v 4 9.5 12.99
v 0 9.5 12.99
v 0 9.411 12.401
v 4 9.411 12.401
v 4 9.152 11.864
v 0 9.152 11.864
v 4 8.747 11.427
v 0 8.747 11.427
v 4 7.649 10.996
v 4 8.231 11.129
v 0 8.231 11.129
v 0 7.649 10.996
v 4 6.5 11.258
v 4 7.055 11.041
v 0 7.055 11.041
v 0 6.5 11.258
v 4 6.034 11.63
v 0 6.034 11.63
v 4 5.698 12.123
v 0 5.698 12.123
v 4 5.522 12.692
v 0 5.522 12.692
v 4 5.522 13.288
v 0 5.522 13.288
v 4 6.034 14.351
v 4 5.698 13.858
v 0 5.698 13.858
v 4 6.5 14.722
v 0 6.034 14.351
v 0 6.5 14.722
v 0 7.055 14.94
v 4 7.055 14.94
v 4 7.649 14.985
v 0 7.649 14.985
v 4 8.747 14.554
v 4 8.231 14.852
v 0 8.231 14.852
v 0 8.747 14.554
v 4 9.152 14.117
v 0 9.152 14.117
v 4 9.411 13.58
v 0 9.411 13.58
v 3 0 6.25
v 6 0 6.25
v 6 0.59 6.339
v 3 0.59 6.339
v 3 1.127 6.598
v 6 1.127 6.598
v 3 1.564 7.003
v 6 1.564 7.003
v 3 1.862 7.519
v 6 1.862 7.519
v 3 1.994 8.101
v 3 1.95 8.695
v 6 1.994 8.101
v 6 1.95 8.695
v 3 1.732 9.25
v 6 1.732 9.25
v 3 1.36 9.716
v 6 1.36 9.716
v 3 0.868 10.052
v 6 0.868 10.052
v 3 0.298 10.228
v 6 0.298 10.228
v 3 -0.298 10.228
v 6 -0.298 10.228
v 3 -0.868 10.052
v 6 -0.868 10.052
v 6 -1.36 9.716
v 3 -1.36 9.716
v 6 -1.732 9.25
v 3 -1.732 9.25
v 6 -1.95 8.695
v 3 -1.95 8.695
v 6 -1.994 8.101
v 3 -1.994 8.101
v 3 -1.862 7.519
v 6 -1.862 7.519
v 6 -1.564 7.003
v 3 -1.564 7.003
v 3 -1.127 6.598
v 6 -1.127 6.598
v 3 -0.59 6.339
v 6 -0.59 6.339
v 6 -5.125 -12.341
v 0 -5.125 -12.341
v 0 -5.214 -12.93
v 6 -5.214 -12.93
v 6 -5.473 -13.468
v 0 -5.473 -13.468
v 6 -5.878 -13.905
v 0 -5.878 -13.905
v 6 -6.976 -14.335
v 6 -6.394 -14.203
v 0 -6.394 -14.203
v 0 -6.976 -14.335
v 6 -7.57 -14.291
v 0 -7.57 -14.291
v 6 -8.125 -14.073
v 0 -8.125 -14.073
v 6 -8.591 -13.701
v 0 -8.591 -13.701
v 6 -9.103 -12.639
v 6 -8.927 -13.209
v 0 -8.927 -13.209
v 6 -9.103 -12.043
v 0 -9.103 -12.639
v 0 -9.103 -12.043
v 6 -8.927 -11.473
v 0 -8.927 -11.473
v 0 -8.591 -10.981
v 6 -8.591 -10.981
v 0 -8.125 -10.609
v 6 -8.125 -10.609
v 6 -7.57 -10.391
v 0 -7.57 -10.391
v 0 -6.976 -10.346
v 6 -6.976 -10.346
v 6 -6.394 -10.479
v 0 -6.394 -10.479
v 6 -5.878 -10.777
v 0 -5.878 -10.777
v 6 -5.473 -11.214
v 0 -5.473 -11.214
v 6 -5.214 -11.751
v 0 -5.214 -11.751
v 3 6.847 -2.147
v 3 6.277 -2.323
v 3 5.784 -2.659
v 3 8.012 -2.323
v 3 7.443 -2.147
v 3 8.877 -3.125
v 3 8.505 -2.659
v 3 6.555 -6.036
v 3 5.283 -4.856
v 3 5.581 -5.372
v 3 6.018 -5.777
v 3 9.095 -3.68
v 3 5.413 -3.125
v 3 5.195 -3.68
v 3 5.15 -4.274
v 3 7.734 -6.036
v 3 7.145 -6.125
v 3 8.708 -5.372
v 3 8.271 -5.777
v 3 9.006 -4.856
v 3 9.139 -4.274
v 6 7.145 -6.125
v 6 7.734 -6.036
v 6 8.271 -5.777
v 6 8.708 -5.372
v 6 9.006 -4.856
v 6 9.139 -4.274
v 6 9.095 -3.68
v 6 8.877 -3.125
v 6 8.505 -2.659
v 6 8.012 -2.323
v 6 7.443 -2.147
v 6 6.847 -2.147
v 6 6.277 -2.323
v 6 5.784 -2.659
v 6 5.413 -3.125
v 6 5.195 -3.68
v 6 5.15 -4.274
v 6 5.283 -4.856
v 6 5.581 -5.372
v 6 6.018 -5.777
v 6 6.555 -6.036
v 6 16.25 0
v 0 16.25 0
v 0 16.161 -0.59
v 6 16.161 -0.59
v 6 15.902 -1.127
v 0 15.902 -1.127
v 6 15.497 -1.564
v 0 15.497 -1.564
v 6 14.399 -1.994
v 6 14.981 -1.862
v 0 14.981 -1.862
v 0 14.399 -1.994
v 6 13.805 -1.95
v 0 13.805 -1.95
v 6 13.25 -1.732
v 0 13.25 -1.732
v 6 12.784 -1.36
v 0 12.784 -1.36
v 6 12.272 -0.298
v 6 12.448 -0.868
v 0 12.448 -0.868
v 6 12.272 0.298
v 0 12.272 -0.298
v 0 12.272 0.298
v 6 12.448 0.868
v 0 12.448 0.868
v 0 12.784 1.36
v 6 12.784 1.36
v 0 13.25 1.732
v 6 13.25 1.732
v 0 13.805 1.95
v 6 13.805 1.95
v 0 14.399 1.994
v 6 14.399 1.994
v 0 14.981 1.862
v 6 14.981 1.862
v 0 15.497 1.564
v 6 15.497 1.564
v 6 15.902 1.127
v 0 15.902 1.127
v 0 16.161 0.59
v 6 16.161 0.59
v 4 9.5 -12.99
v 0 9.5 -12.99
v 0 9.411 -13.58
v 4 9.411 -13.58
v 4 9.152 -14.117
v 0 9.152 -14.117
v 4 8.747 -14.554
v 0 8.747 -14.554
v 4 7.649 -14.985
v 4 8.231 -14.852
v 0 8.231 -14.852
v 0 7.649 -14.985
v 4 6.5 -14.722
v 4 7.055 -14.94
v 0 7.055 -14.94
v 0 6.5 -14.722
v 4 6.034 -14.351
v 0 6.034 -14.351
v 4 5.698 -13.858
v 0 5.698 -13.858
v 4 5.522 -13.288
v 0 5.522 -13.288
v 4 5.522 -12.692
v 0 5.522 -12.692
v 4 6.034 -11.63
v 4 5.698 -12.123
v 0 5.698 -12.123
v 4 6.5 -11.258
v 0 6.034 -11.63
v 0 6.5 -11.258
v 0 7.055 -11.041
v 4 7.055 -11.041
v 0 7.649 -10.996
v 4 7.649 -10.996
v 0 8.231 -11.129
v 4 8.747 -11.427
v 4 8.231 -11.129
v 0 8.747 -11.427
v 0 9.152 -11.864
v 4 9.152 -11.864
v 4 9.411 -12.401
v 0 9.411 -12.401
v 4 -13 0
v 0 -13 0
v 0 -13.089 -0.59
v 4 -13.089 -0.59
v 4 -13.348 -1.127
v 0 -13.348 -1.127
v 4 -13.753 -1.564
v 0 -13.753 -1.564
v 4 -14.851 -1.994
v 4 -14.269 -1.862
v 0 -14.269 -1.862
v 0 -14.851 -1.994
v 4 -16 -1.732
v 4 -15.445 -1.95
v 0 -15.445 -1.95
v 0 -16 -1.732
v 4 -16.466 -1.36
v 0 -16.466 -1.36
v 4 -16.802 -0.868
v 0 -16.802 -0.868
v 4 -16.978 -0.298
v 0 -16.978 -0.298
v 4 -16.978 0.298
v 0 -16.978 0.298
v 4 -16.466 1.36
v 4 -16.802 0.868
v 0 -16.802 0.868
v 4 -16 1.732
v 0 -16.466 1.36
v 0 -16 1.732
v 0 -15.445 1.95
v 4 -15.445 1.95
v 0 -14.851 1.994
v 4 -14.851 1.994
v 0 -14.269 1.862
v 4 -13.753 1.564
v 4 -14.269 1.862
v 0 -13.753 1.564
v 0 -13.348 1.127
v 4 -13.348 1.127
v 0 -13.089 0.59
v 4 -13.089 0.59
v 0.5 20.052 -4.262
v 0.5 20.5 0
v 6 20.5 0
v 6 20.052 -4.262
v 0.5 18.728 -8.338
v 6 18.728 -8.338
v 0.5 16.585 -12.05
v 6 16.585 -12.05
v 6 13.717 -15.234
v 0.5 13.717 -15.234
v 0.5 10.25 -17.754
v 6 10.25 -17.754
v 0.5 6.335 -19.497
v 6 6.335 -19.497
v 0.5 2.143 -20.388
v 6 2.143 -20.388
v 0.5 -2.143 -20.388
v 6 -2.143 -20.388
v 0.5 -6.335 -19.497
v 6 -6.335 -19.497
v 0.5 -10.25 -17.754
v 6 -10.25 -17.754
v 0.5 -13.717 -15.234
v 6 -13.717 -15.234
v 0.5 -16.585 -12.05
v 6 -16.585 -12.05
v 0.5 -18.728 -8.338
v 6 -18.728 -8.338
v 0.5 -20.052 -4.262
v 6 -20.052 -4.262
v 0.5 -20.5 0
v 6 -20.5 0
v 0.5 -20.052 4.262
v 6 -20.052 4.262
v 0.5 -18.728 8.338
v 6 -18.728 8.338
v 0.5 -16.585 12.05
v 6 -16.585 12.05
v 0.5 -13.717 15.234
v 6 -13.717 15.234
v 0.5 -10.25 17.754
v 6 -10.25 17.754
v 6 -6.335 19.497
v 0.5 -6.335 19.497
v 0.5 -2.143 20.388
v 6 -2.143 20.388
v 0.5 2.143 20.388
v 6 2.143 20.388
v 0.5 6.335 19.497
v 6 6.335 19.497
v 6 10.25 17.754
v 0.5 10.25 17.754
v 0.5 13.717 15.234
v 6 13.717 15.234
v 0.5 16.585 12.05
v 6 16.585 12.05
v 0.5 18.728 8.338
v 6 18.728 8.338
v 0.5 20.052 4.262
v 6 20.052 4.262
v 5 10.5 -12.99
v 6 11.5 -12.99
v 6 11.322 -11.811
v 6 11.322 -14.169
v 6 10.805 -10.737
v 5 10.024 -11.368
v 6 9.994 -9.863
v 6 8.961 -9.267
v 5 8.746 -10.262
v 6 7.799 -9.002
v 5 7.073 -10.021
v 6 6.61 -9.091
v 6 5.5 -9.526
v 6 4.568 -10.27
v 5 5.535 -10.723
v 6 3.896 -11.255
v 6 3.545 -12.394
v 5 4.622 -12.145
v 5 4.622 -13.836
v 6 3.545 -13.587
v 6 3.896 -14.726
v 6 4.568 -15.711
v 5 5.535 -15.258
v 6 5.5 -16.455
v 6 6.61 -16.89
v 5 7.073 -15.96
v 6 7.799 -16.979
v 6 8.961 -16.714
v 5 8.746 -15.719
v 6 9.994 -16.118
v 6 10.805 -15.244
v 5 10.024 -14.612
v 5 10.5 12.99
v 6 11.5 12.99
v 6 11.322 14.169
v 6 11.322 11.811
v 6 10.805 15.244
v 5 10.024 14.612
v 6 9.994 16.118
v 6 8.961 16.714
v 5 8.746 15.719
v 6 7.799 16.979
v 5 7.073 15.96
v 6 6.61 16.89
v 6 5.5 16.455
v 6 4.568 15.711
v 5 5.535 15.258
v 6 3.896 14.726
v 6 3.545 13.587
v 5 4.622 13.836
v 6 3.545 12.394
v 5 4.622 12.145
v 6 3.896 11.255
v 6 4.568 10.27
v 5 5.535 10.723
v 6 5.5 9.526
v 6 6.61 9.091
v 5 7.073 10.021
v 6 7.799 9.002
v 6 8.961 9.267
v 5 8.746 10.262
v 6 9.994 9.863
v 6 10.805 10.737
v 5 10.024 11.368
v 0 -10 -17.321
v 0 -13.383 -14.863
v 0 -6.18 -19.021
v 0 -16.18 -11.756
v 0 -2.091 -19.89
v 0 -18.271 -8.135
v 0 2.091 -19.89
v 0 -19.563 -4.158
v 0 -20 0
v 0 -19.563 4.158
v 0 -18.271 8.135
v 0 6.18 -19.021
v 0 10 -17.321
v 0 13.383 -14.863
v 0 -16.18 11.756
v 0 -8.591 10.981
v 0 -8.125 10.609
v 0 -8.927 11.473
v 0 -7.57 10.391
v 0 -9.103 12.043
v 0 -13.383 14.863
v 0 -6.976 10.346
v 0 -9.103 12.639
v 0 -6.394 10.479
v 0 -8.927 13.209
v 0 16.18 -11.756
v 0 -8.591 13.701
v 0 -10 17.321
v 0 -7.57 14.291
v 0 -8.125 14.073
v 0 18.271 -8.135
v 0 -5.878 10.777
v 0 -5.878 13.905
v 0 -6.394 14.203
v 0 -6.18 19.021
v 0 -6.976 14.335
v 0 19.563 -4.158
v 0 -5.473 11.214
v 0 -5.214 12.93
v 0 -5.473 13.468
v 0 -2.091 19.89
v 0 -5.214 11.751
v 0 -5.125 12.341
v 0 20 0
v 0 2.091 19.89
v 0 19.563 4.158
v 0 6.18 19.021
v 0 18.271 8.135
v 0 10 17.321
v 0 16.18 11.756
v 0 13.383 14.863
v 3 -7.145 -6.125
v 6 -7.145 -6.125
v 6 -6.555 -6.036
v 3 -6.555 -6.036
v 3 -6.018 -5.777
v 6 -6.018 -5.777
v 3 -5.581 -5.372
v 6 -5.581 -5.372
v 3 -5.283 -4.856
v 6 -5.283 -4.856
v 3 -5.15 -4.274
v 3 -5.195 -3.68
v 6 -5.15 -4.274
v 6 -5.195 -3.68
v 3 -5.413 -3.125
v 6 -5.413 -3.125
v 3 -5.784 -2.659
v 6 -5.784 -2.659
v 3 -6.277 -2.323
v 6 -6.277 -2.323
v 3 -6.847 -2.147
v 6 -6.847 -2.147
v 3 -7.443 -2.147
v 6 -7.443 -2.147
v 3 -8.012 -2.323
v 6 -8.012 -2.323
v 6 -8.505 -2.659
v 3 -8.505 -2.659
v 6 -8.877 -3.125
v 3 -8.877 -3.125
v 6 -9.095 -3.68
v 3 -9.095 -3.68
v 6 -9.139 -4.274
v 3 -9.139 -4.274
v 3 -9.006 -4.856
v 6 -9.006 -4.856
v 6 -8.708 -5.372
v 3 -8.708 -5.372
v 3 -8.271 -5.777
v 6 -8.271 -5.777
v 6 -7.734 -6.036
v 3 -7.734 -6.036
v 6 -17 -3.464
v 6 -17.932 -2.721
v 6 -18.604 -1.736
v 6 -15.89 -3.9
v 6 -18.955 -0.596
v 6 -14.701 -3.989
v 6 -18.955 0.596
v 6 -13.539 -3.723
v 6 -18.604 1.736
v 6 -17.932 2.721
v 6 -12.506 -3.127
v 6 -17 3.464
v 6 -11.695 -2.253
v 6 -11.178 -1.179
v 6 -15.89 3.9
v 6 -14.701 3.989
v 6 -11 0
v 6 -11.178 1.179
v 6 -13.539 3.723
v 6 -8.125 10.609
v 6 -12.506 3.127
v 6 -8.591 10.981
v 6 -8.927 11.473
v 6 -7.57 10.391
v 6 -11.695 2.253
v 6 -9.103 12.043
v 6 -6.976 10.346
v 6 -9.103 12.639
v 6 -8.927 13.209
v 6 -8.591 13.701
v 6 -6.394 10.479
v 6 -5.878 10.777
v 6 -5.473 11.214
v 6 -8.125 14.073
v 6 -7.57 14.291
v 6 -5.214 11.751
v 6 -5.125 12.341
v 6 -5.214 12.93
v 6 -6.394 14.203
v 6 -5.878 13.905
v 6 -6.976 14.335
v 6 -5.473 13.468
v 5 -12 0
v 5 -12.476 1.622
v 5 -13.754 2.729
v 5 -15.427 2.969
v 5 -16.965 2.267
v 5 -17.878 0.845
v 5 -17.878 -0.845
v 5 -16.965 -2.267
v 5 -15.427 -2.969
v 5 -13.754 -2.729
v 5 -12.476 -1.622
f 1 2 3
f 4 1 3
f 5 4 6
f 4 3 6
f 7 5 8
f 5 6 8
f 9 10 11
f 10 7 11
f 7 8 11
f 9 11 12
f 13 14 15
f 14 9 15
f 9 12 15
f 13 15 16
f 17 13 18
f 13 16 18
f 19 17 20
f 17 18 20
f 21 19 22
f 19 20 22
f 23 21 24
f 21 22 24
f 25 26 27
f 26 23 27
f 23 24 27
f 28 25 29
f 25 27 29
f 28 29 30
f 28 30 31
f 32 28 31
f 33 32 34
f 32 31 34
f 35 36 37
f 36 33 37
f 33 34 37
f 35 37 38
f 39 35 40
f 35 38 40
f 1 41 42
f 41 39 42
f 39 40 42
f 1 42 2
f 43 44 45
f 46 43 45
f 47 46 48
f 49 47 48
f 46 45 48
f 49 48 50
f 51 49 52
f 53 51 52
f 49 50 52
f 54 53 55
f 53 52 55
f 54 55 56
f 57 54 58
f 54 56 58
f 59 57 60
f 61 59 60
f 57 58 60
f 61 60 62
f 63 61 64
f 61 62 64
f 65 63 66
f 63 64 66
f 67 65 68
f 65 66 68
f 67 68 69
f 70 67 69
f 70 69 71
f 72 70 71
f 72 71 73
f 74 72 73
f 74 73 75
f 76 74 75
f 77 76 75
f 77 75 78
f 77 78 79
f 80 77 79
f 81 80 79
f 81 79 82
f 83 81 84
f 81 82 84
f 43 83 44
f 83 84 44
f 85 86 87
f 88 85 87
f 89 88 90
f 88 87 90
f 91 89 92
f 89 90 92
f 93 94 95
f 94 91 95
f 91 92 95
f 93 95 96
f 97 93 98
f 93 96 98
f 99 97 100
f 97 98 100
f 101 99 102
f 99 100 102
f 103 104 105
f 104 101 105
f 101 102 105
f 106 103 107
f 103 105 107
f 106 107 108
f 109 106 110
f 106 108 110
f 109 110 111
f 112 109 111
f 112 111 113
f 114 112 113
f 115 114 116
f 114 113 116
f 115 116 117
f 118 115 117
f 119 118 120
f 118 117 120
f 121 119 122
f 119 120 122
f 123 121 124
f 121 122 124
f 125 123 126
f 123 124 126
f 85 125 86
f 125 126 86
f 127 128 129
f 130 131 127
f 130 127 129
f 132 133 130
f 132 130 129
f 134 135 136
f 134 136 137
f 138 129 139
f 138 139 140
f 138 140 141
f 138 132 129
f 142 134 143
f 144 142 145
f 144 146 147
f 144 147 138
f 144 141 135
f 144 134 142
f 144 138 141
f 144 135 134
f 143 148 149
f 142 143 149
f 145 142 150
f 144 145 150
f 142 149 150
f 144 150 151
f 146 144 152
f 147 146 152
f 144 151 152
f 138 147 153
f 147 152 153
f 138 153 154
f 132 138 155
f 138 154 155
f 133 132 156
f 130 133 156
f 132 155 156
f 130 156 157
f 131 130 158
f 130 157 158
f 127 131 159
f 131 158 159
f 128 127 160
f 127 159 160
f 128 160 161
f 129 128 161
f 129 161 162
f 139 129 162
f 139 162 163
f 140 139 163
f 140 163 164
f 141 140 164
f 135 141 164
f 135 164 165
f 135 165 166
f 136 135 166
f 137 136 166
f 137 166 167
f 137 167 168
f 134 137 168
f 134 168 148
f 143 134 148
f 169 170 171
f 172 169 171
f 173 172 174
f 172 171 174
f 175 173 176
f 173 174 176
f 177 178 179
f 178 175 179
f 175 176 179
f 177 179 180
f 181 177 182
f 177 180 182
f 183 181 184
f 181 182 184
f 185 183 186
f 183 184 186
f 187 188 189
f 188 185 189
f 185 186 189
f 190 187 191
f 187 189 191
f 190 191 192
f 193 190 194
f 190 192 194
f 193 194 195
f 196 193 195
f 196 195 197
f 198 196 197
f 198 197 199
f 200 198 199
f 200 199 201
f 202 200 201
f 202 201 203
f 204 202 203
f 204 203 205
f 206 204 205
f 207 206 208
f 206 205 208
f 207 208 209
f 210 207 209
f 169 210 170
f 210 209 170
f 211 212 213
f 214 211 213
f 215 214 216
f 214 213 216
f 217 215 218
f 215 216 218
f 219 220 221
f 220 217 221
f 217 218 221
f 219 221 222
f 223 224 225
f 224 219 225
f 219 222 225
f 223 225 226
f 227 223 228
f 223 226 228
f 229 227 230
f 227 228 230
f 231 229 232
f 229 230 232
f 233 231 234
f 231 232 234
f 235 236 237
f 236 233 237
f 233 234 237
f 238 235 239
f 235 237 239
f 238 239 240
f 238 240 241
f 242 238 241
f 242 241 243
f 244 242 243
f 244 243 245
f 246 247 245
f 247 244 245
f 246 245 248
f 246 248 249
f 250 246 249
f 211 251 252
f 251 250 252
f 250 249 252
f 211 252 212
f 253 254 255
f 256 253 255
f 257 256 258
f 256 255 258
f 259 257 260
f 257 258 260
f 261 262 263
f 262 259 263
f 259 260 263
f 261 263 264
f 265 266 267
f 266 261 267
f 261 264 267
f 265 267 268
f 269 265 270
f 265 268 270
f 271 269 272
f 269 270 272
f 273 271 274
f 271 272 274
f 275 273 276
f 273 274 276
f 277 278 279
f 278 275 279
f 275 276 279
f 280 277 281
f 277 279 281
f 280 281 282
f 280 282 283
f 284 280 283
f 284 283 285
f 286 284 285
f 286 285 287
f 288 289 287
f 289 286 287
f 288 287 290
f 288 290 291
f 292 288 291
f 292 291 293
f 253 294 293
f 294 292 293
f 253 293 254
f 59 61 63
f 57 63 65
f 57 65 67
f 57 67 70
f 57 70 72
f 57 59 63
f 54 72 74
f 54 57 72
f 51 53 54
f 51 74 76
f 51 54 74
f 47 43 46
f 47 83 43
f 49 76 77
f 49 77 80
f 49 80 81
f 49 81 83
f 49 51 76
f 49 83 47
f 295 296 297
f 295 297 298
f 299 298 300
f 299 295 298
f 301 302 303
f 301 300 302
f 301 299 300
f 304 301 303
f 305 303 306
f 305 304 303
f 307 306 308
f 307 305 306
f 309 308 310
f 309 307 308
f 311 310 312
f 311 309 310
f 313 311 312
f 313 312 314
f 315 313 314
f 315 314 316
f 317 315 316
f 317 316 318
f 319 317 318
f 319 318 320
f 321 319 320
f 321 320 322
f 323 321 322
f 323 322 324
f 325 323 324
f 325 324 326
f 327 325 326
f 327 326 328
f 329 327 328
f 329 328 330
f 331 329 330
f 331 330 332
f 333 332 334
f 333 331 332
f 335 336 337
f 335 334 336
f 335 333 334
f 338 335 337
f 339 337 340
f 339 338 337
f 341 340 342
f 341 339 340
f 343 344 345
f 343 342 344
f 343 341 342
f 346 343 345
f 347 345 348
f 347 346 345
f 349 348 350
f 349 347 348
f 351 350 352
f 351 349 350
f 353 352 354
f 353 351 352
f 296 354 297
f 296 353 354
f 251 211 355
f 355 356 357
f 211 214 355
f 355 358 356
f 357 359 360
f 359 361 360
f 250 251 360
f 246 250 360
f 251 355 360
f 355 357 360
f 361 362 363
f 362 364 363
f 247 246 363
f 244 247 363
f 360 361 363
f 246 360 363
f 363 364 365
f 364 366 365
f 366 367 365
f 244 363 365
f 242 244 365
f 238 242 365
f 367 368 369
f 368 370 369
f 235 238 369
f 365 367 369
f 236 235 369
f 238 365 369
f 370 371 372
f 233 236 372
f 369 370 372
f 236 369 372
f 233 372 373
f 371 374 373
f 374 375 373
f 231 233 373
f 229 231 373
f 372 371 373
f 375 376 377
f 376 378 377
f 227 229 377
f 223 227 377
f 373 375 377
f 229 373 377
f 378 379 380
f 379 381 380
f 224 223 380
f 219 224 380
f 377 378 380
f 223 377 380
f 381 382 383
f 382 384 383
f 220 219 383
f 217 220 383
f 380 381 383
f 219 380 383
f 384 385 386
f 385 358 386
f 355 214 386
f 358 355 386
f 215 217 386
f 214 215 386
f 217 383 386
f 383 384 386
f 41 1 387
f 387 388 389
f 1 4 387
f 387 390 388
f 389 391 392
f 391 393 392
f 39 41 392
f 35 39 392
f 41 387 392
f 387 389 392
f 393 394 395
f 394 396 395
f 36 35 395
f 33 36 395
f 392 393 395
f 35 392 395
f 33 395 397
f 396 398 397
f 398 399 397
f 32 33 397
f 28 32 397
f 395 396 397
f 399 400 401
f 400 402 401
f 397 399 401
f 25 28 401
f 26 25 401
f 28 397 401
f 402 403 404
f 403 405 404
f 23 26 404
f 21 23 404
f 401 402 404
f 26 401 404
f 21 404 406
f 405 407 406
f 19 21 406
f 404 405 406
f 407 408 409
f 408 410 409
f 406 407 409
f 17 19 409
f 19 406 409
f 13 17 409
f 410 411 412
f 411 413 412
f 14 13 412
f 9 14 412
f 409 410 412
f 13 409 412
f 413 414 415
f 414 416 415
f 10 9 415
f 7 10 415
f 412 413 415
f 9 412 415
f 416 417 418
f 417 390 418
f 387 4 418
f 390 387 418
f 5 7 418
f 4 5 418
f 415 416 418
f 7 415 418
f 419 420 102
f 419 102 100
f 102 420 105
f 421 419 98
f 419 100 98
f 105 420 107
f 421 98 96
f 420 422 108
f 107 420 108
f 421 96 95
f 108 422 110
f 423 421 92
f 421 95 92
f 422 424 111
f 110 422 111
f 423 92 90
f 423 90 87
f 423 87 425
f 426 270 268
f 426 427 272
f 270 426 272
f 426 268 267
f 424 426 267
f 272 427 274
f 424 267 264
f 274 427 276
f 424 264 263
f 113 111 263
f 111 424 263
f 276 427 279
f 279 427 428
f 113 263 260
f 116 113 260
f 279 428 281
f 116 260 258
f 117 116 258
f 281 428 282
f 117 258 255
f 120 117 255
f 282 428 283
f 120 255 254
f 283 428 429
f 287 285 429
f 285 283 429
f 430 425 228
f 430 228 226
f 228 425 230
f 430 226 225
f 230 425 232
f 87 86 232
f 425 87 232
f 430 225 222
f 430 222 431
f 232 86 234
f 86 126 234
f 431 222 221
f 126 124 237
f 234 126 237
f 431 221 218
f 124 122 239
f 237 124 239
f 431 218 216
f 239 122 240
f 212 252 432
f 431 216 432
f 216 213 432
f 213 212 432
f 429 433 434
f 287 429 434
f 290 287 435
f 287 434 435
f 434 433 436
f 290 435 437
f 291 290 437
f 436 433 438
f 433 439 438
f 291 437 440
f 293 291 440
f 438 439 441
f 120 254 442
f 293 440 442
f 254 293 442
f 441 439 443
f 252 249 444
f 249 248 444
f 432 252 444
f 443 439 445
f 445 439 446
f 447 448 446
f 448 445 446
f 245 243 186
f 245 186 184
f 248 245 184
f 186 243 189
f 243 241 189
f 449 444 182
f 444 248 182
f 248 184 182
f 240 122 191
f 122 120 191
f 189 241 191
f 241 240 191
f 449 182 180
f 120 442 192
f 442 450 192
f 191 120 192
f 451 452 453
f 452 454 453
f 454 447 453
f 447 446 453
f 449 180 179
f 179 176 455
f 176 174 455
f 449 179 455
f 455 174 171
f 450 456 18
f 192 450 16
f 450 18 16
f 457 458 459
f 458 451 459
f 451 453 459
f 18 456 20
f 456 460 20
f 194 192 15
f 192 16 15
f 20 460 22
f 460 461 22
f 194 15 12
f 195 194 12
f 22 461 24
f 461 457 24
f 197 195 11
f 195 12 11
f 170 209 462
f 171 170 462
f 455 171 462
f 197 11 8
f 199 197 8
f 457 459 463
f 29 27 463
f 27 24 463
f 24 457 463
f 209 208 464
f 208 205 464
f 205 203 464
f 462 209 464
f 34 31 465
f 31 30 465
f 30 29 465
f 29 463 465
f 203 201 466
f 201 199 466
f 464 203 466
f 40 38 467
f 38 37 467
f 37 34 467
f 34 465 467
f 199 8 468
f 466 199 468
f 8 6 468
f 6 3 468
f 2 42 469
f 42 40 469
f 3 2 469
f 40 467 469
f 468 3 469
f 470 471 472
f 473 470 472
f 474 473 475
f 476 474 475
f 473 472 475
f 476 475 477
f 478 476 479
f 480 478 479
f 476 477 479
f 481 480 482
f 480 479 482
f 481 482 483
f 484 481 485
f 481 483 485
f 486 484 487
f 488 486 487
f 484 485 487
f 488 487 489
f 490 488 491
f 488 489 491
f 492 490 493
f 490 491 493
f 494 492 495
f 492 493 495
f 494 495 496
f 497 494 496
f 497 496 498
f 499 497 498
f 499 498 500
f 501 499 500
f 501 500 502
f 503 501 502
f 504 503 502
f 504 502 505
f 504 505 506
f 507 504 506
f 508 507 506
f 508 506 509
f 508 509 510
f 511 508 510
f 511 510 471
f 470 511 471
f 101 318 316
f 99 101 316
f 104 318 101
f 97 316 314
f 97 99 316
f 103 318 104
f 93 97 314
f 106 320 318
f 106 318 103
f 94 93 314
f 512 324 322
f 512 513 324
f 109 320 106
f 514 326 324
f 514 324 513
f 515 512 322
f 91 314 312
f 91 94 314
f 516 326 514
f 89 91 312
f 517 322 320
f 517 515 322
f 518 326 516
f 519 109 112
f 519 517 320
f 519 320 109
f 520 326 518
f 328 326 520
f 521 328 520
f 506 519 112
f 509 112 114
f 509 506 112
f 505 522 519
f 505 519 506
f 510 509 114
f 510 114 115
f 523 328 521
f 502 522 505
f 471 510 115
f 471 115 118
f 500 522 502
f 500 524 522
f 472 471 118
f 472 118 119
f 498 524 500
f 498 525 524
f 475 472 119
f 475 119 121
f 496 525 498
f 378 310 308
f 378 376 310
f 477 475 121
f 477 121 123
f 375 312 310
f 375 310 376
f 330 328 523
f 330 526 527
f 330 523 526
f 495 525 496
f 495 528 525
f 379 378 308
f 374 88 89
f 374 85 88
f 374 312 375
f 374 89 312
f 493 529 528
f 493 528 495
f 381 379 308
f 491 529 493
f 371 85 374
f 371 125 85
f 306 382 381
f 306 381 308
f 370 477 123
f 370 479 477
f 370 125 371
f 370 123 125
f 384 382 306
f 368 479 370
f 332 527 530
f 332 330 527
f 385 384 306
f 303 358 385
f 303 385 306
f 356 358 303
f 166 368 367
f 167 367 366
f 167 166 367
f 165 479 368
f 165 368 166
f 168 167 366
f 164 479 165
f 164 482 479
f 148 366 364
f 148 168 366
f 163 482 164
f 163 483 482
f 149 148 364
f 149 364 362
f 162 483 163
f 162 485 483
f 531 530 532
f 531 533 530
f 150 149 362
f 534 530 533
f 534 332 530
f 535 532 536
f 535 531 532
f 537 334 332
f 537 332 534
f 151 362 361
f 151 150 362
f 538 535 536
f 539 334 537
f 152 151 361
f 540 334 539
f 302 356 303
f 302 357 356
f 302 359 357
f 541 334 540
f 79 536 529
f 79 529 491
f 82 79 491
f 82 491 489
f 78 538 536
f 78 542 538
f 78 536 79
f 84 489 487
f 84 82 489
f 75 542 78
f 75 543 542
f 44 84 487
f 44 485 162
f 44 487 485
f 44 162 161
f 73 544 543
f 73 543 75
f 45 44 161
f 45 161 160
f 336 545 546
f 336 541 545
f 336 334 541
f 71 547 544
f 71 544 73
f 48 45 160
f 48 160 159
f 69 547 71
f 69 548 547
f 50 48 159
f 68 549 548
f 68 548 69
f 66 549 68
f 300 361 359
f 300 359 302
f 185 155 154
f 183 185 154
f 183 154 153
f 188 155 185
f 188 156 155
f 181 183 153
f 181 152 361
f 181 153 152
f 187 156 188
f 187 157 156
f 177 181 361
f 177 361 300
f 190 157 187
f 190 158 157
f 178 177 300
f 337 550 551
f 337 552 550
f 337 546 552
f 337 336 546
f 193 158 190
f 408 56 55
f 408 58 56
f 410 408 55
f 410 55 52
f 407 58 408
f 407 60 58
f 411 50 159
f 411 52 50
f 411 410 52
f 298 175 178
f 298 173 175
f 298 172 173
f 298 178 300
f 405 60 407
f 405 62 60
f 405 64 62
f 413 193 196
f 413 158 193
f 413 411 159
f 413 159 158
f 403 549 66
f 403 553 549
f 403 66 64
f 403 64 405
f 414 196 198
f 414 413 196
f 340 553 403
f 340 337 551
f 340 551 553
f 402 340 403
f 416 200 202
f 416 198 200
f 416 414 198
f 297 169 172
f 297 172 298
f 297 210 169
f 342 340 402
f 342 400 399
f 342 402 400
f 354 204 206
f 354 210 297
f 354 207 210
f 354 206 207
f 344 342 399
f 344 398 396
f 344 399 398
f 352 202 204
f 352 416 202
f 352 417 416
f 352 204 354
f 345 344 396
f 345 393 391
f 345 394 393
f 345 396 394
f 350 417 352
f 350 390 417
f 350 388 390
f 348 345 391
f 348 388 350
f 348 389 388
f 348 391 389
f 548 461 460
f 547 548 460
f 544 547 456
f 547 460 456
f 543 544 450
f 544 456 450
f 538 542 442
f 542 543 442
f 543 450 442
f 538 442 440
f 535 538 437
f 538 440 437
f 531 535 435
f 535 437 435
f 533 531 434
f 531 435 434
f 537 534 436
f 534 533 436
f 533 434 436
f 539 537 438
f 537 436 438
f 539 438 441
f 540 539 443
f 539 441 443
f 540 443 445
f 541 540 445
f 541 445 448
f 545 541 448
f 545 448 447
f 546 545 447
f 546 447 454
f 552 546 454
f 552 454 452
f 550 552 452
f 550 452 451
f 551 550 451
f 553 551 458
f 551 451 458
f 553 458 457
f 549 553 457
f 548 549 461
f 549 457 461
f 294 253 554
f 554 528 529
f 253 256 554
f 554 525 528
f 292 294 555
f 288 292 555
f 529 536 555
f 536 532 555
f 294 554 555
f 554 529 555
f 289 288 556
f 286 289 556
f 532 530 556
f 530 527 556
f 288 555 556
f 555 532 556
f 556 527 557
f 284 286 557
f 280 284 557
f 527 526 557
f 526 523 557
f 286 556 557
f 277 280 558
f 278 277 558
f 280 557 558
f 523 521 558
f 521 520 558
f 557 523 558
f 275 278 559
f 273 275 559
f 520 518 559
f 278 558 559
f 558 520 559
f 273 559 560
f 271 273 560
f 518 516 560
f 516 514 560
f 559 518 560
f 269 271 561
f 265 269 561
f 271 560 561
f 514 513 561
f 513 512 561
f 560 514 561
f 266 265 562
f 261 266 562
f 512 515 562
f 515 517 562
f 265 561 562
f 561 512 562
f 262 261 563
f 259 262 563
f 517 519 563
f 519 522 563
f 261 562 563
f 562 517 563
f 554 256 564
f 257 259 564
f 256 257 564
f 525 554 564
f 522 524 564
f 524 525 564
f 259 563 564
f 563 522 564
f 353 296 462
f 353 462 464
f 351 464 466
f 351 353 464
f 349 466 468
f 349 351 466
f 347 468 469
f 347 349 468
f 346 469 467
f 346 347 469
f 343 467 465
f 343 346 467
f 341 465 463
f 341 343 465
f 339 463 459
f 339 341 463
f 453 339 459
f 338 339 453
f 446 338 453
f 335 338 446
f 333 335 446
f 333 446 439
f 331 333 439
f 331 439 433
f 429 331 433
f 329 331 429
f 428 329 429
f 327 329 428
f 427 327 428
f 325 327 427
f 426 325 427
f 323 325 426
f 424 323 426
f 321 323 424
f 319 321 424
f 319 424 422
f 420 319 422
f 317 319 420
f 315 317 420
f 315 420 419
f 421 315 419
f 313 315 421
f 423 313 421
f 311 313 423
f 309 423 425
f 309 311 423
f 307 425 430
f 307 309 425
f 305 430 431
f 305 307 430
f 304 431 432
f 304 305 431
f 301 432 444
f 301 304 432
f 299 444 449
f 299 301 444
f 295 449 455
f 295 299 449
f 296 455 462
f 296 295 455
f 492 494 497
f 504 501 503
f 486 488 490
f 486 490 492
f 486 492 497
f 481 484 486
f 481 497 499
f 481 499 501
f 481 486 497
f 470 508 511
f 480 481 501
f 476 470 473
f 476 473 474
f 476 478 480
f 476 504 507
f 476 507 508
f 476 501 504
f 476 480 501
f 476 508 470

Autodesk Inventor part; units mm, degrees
ref_plane "YZ Plane" through (0, 0, 0) normal (1, 0, 0) x (0, 1, 0)
ref_plane "XZ Plane" through (0, 0, 0) normal (0, 1, 0) x (-1, 0, 0)
ref_plane "XY Plane" through (0, 0, 0) normal (0, 0, 1) x (1, 0, 0)
sketch "Sketch1" plane through (0, 0, 0) normal (1, 0, 0) x (0, 1, 0)
  circle A0 centre (0, 0) radius 20.5
  circle A1 centre (0, 0) radius 15 construction
  line L0 (0, 0) -> (16.0369, -27.7767) construction
  line L1 (16.0369, -27.7767) -> (16.0369, 0) construction
  line L2 (16.0369, 0) -> (0, 0) construction
  circle A2 centre (0, 0) radius 14.25 construction
  line L3 (0, 0) -> (-15.2425, -26.4009) construction
  line L4 (-15.2425, -26.4009) -> (-20.5, 0) construction
  line L5 (0, 0) -> (-20.5, 0) construction
  circle A3 centre (7.5, -12.9904) radius 2
  circle A4 centre (7.5, 12.9904) radius 2
  circle A5 centre (-15, 0) radius 2
  circle A6 centre (14.25, 0) radius 2
  circle A7 centre (-7.125, 12.3409) radius 2
  circle A8 centre (-7.125, -12.3409) radius 2
  dimension "d0" = 41
  dimension "d1" = 30
  dimension "d16" = 28.5
  dimension "d15" = 60
  dimension "d22" = 60
  dimension "d28" = 4
  dimension "d31" = 360
  dimension "d33" = 4
  dimension "d36" = 360
extrude "Extrusion1" add sketch "Sketch1" along normal blind 6
chamfer "Chamfer2" distance 0.5 angle 45 1 edges at (0, -20.5, 0)
chamfer "Chamfer3" distance 2 angle 45 3 edges at (6, 5.5, 12.9904) (6, 5.5, -12.9904) (6, -17, 0)
sketch "Sketch5" plane through (6, 0, 0) normal (1, 0, 0) x (0, 0, -1)
  circle A0 centre (0, 0) radius 8.25 construction
  line L0 (0, 0) -> (16.9526, 0) construction
  line L1 (0, 0) -> (12.1845, 21.1041) construction
  circle A1 centre (4.125, 7.1447) radius 2
  circle A2 centre (-8.25, 0) radius 2
  circle A3 centre (4.125, -7.1447) radius 2
  dimension "d44" = 16.5
  dimension "d45" = 60
  dimension "d46" = 4
  dimension "d49" = 360
extrude "Extrusion3" cut sketch "Sketch5" against normal blind 3
properties part number "ab_hip_joint_connector"
